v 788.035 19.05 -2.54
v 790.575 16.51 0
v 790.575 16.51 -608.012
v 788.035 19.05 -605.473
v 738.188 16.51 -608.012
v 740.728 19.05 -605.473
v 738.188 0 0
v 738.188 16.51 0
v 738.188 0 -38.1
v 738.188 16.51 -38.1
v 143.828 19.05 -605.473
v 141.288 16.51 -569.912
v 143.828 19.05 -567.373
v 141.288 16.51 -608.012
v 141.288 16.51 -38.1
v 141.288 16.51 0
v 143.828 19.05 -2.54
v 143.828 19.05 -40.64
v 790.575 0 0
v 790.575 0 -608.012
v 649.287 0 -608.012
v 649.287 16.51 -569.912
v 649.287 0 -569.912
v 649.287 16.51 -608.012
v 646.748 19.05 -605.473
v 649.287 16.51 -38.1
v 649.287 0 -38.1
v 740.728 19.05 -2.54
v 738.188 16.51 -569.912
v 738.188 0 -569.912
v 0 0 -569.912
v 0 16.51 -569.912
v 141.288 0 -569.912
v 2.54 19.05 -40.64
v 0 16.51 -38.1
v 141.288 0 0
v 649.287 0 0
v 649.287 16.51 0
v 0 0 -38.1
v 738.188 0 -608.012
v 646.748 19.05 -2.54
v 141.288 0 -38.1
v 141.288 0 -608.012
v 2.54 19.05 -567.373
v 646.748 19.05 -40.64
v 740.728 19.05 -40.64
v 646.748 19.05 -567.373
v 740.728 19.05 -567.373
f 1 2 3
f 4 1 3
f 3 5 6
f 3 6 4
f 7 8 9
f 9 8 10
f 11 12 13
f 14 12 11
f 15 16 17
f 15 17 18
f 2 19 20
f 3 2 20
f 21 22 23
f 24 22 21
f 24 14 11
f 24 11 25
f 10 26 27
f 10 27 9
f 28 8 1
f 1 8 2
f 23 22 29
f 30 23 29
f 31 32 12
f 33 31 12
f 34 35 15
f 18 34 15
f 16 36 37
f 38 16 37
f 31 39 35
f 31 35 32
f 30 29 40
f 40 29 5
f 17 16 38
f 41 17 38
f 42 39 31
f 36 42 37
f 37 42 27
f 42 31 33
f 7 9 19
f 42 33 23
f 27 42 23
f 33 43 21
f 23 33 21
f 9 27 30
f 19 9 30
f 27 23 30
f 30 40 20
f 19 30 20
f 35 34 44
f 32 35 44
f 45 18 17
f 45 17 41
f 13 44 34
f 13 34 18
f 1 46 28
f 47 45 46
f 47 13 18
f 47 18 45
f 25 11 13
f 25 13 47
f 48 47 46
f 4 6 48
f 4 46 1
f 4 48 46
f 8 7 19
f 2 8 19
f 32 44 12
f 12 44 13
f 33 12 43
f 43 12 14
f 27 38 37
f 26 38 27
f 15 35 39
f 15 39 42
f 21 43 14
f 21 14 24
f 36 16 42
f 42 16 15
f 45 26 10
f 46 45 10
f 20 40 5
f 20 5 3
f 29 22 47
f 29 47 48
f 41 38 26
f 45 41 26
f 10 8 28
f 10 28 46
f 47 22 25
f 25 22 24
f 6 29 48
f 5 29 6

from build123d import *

# Parameters (mm, degrees)
SKETCH1_W           = 790.575
SKETCH1_H           = 608.0125
BOSS_EXTRUDE1_DEPTH = 19.05
SKETCH2_W           = 88.9
SKETCH2_H           = 38.1
SKETCH2_W_2         = 141.2875
CUT_EXTRUDE1_DEPTH  = 20.05
CHAMFER1_SIZE       = 2.54


with BuildPart() as part:
    # Sketch1 → Boss-Extrude1 (new body)
    with BuildSketch(Plane(origin=(0, 0, 0), x_dir=(1, 0, 0), z_dir=(0, 1, 0))):
        with Locations((395.2875, 304.00625)):
            Rectangle(SKETCH1_W, SKETCH1_H)
    extrude(amount=BOSS_EXTRUDE1_DEPTH)

    # Sketch2 → Cut-Extrude1 (cut, through all)
    with BuildSketch(Plane(origin=(0, 19.05, 0), x_dir=(1, 0, 0), z_dir=(0, 1, 0))):
        with Locations((693.7375, 588.9625)):
            Rectangle(SKETCH2_W, SKETCH2_H)
        with Locations((70.64375, 588.9625)):
            Rectangle(SKETCH2_W_2, SKETCH2_H)
        with Locations((70.64375, 19.05)):
            Rectangle(SKETCH2_W_2, SKETCH2_H)
        with Locations((693.7375, 19.05)):
            Rectangle(SKETCH2_W, SKETCH2_H)
    extrude(amount=-CUT_EXTRUDE1_DEPTH, mode=Mode.SUBTRACT)

    # Chamfer1
    chamfer1_edges = [part.edges().sort_by_distance(p)[0] for p in [
        (790.575, 19.05, -304.00625),
        (764.38125, 19.05, -608.0125),
        (0, 19.05, -304.00625),
        (395.2875, 19.05, 0),
        (764.38125, 19.05, 0),
        (395.2875, 19.05, -608.0125),
        (693.7375, 19.05, -38.1),
        (649.2875, 19.05, -19.05),
        (738.1875, 19.05, -19.05),
        (141.2875, 19.05, -19.05),
        (70.64375, 19.05, -38.1),
        (70.64375, 19.05, -569.9125),
        (141.2875, 19.05, -588.9625),
        (738.1875, 19.05, -588.9625),
        (649.2875, 19.05, -588.9625),
        (693.7375, 19.05, -569.9125),
    ]]
    chamfer(chamfer1_edges, length=CHAMFER1_SIZE)


solid = part.part
